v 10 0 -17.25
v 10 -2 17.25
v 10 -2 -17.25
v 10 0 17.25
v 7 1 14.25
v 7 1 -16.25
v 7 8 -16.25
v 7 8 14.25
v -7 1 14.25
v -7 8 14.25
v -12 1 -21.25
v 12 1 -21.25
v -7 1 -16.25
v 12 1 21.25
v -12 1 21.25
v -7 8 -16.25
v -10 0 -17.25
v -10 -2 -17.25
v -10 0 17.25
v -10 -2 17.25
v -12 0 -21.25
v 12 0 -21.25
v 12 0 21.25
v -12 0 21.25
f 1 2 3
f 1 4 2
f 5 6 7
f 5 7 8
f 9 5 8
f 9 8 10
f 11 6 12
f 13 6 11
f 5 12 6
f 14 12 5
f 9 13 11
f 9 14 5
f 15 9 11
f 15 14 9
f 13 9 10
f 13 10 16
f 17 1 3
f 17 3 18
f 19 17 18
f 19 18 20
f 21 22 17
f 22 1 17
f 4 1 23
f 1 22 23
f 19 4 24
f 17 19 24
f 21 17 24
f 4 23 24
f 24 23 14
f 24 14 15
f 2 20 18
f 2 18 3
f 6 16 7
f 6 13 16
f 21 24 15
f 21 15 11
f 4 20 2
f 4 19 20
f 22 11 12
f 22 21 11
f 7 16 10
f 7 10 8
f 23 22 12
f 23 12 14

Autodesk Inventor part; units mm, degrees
ref_plane "YZ Plane" through (0, 0, 0) normal (1, 0, 0) x (0, 1, 0)
ref_plane "XZ Plane" through (0, 0, 0) normal (0, 1, 0) x (-1, 0, 0)
ref_plane "XY Plane" through (0, 0, 0) normal (0, 0, 1) x (1, 0, 0)
sketch "スケッチ1" plane through (0, 0, 0) normal (0, 1, 0) x (-1, 0, 0)
  line L0 (12, -21.25) -> (-12, -21.25)
  line L1 (-12, -21.25) -> (-12, 21.25)
  line L2 (-12, 21.25) -> (12, 21.25)
  line L3 (12, 21.25) -> (12, -21.25)
  line L4 (12, -21.25) -> (-12, 21.25) construction
  line L5 (-12, -21.25) -> (12, 21.25) construction
  point P0 (0, 0)
  dimension "d0" = 24
  dimension "d1" = 42.5
extrude "押し出し1" add sketch "スケッチ1" along normal blind 1
sketch "スケッチ2" plane through (0, 0, 0) normal (0, -1, 0) x (1, 0, 0)
  line L0 (-12, 21.25) -> (12, 21.25) projected
  line L1 (-12, -21.25) -> (-12, 21.25) projected
  line L2 (12, -21.25) -> (-12, -21.25) projected
  line L3 (12, 21.25) -> (12, -21.25) projected
  line L4 (-10, 17.25) -> (10, 17.25)
  line L5 (10, 17.25) -> (10, -17.25)
  line L6 (10, -17.25) -> (-10, -17.25)
  line L7 (-10, -17.25) -> (-10, 17.25)
  point P0 (0, 0)
  dimension "d4" = 4
  dimension "d5" = 4
  dimension "d6" = 2
  dimension "d7" = 2
extrude "押し出し2" add sketch "スケッチ2" along normal blind 2 contours L4 L5 L6 L7
sketch "スケッチ3" plane through (0, 1, 0) normal (0, 1, 0) x (1, 0, 0)
  line L0 (7, -14.25) -> (-7, -14.25)
  line L1 (-7, -14.25) -> (-7, 16.25)
  line L2 (-7, 16.25) -> (7, 16.25)
  line L3 (7, 16.25) -> (7, -14.25)
  line L4 (-12, -21.25) -> (12, -21.25) projected
  line L5 (12, 21.25) -> (-12, 21.25) projected
  line L6 (12, -21.25) -> (12, 21.25) projected
  line L7 (-12, 21.25) -> (-12, -21.25) projected
  point P0 (0, 0)
  dimension "d10" = 7
  dimension "d11" = 5
  dimension "d12" = 5
  dimension "d13" = 5
extrude "押し出し3" add sketch "スケッチ3" along normal blind 7 contours L0 L1 L2 L3
properties part number "HW-069"
